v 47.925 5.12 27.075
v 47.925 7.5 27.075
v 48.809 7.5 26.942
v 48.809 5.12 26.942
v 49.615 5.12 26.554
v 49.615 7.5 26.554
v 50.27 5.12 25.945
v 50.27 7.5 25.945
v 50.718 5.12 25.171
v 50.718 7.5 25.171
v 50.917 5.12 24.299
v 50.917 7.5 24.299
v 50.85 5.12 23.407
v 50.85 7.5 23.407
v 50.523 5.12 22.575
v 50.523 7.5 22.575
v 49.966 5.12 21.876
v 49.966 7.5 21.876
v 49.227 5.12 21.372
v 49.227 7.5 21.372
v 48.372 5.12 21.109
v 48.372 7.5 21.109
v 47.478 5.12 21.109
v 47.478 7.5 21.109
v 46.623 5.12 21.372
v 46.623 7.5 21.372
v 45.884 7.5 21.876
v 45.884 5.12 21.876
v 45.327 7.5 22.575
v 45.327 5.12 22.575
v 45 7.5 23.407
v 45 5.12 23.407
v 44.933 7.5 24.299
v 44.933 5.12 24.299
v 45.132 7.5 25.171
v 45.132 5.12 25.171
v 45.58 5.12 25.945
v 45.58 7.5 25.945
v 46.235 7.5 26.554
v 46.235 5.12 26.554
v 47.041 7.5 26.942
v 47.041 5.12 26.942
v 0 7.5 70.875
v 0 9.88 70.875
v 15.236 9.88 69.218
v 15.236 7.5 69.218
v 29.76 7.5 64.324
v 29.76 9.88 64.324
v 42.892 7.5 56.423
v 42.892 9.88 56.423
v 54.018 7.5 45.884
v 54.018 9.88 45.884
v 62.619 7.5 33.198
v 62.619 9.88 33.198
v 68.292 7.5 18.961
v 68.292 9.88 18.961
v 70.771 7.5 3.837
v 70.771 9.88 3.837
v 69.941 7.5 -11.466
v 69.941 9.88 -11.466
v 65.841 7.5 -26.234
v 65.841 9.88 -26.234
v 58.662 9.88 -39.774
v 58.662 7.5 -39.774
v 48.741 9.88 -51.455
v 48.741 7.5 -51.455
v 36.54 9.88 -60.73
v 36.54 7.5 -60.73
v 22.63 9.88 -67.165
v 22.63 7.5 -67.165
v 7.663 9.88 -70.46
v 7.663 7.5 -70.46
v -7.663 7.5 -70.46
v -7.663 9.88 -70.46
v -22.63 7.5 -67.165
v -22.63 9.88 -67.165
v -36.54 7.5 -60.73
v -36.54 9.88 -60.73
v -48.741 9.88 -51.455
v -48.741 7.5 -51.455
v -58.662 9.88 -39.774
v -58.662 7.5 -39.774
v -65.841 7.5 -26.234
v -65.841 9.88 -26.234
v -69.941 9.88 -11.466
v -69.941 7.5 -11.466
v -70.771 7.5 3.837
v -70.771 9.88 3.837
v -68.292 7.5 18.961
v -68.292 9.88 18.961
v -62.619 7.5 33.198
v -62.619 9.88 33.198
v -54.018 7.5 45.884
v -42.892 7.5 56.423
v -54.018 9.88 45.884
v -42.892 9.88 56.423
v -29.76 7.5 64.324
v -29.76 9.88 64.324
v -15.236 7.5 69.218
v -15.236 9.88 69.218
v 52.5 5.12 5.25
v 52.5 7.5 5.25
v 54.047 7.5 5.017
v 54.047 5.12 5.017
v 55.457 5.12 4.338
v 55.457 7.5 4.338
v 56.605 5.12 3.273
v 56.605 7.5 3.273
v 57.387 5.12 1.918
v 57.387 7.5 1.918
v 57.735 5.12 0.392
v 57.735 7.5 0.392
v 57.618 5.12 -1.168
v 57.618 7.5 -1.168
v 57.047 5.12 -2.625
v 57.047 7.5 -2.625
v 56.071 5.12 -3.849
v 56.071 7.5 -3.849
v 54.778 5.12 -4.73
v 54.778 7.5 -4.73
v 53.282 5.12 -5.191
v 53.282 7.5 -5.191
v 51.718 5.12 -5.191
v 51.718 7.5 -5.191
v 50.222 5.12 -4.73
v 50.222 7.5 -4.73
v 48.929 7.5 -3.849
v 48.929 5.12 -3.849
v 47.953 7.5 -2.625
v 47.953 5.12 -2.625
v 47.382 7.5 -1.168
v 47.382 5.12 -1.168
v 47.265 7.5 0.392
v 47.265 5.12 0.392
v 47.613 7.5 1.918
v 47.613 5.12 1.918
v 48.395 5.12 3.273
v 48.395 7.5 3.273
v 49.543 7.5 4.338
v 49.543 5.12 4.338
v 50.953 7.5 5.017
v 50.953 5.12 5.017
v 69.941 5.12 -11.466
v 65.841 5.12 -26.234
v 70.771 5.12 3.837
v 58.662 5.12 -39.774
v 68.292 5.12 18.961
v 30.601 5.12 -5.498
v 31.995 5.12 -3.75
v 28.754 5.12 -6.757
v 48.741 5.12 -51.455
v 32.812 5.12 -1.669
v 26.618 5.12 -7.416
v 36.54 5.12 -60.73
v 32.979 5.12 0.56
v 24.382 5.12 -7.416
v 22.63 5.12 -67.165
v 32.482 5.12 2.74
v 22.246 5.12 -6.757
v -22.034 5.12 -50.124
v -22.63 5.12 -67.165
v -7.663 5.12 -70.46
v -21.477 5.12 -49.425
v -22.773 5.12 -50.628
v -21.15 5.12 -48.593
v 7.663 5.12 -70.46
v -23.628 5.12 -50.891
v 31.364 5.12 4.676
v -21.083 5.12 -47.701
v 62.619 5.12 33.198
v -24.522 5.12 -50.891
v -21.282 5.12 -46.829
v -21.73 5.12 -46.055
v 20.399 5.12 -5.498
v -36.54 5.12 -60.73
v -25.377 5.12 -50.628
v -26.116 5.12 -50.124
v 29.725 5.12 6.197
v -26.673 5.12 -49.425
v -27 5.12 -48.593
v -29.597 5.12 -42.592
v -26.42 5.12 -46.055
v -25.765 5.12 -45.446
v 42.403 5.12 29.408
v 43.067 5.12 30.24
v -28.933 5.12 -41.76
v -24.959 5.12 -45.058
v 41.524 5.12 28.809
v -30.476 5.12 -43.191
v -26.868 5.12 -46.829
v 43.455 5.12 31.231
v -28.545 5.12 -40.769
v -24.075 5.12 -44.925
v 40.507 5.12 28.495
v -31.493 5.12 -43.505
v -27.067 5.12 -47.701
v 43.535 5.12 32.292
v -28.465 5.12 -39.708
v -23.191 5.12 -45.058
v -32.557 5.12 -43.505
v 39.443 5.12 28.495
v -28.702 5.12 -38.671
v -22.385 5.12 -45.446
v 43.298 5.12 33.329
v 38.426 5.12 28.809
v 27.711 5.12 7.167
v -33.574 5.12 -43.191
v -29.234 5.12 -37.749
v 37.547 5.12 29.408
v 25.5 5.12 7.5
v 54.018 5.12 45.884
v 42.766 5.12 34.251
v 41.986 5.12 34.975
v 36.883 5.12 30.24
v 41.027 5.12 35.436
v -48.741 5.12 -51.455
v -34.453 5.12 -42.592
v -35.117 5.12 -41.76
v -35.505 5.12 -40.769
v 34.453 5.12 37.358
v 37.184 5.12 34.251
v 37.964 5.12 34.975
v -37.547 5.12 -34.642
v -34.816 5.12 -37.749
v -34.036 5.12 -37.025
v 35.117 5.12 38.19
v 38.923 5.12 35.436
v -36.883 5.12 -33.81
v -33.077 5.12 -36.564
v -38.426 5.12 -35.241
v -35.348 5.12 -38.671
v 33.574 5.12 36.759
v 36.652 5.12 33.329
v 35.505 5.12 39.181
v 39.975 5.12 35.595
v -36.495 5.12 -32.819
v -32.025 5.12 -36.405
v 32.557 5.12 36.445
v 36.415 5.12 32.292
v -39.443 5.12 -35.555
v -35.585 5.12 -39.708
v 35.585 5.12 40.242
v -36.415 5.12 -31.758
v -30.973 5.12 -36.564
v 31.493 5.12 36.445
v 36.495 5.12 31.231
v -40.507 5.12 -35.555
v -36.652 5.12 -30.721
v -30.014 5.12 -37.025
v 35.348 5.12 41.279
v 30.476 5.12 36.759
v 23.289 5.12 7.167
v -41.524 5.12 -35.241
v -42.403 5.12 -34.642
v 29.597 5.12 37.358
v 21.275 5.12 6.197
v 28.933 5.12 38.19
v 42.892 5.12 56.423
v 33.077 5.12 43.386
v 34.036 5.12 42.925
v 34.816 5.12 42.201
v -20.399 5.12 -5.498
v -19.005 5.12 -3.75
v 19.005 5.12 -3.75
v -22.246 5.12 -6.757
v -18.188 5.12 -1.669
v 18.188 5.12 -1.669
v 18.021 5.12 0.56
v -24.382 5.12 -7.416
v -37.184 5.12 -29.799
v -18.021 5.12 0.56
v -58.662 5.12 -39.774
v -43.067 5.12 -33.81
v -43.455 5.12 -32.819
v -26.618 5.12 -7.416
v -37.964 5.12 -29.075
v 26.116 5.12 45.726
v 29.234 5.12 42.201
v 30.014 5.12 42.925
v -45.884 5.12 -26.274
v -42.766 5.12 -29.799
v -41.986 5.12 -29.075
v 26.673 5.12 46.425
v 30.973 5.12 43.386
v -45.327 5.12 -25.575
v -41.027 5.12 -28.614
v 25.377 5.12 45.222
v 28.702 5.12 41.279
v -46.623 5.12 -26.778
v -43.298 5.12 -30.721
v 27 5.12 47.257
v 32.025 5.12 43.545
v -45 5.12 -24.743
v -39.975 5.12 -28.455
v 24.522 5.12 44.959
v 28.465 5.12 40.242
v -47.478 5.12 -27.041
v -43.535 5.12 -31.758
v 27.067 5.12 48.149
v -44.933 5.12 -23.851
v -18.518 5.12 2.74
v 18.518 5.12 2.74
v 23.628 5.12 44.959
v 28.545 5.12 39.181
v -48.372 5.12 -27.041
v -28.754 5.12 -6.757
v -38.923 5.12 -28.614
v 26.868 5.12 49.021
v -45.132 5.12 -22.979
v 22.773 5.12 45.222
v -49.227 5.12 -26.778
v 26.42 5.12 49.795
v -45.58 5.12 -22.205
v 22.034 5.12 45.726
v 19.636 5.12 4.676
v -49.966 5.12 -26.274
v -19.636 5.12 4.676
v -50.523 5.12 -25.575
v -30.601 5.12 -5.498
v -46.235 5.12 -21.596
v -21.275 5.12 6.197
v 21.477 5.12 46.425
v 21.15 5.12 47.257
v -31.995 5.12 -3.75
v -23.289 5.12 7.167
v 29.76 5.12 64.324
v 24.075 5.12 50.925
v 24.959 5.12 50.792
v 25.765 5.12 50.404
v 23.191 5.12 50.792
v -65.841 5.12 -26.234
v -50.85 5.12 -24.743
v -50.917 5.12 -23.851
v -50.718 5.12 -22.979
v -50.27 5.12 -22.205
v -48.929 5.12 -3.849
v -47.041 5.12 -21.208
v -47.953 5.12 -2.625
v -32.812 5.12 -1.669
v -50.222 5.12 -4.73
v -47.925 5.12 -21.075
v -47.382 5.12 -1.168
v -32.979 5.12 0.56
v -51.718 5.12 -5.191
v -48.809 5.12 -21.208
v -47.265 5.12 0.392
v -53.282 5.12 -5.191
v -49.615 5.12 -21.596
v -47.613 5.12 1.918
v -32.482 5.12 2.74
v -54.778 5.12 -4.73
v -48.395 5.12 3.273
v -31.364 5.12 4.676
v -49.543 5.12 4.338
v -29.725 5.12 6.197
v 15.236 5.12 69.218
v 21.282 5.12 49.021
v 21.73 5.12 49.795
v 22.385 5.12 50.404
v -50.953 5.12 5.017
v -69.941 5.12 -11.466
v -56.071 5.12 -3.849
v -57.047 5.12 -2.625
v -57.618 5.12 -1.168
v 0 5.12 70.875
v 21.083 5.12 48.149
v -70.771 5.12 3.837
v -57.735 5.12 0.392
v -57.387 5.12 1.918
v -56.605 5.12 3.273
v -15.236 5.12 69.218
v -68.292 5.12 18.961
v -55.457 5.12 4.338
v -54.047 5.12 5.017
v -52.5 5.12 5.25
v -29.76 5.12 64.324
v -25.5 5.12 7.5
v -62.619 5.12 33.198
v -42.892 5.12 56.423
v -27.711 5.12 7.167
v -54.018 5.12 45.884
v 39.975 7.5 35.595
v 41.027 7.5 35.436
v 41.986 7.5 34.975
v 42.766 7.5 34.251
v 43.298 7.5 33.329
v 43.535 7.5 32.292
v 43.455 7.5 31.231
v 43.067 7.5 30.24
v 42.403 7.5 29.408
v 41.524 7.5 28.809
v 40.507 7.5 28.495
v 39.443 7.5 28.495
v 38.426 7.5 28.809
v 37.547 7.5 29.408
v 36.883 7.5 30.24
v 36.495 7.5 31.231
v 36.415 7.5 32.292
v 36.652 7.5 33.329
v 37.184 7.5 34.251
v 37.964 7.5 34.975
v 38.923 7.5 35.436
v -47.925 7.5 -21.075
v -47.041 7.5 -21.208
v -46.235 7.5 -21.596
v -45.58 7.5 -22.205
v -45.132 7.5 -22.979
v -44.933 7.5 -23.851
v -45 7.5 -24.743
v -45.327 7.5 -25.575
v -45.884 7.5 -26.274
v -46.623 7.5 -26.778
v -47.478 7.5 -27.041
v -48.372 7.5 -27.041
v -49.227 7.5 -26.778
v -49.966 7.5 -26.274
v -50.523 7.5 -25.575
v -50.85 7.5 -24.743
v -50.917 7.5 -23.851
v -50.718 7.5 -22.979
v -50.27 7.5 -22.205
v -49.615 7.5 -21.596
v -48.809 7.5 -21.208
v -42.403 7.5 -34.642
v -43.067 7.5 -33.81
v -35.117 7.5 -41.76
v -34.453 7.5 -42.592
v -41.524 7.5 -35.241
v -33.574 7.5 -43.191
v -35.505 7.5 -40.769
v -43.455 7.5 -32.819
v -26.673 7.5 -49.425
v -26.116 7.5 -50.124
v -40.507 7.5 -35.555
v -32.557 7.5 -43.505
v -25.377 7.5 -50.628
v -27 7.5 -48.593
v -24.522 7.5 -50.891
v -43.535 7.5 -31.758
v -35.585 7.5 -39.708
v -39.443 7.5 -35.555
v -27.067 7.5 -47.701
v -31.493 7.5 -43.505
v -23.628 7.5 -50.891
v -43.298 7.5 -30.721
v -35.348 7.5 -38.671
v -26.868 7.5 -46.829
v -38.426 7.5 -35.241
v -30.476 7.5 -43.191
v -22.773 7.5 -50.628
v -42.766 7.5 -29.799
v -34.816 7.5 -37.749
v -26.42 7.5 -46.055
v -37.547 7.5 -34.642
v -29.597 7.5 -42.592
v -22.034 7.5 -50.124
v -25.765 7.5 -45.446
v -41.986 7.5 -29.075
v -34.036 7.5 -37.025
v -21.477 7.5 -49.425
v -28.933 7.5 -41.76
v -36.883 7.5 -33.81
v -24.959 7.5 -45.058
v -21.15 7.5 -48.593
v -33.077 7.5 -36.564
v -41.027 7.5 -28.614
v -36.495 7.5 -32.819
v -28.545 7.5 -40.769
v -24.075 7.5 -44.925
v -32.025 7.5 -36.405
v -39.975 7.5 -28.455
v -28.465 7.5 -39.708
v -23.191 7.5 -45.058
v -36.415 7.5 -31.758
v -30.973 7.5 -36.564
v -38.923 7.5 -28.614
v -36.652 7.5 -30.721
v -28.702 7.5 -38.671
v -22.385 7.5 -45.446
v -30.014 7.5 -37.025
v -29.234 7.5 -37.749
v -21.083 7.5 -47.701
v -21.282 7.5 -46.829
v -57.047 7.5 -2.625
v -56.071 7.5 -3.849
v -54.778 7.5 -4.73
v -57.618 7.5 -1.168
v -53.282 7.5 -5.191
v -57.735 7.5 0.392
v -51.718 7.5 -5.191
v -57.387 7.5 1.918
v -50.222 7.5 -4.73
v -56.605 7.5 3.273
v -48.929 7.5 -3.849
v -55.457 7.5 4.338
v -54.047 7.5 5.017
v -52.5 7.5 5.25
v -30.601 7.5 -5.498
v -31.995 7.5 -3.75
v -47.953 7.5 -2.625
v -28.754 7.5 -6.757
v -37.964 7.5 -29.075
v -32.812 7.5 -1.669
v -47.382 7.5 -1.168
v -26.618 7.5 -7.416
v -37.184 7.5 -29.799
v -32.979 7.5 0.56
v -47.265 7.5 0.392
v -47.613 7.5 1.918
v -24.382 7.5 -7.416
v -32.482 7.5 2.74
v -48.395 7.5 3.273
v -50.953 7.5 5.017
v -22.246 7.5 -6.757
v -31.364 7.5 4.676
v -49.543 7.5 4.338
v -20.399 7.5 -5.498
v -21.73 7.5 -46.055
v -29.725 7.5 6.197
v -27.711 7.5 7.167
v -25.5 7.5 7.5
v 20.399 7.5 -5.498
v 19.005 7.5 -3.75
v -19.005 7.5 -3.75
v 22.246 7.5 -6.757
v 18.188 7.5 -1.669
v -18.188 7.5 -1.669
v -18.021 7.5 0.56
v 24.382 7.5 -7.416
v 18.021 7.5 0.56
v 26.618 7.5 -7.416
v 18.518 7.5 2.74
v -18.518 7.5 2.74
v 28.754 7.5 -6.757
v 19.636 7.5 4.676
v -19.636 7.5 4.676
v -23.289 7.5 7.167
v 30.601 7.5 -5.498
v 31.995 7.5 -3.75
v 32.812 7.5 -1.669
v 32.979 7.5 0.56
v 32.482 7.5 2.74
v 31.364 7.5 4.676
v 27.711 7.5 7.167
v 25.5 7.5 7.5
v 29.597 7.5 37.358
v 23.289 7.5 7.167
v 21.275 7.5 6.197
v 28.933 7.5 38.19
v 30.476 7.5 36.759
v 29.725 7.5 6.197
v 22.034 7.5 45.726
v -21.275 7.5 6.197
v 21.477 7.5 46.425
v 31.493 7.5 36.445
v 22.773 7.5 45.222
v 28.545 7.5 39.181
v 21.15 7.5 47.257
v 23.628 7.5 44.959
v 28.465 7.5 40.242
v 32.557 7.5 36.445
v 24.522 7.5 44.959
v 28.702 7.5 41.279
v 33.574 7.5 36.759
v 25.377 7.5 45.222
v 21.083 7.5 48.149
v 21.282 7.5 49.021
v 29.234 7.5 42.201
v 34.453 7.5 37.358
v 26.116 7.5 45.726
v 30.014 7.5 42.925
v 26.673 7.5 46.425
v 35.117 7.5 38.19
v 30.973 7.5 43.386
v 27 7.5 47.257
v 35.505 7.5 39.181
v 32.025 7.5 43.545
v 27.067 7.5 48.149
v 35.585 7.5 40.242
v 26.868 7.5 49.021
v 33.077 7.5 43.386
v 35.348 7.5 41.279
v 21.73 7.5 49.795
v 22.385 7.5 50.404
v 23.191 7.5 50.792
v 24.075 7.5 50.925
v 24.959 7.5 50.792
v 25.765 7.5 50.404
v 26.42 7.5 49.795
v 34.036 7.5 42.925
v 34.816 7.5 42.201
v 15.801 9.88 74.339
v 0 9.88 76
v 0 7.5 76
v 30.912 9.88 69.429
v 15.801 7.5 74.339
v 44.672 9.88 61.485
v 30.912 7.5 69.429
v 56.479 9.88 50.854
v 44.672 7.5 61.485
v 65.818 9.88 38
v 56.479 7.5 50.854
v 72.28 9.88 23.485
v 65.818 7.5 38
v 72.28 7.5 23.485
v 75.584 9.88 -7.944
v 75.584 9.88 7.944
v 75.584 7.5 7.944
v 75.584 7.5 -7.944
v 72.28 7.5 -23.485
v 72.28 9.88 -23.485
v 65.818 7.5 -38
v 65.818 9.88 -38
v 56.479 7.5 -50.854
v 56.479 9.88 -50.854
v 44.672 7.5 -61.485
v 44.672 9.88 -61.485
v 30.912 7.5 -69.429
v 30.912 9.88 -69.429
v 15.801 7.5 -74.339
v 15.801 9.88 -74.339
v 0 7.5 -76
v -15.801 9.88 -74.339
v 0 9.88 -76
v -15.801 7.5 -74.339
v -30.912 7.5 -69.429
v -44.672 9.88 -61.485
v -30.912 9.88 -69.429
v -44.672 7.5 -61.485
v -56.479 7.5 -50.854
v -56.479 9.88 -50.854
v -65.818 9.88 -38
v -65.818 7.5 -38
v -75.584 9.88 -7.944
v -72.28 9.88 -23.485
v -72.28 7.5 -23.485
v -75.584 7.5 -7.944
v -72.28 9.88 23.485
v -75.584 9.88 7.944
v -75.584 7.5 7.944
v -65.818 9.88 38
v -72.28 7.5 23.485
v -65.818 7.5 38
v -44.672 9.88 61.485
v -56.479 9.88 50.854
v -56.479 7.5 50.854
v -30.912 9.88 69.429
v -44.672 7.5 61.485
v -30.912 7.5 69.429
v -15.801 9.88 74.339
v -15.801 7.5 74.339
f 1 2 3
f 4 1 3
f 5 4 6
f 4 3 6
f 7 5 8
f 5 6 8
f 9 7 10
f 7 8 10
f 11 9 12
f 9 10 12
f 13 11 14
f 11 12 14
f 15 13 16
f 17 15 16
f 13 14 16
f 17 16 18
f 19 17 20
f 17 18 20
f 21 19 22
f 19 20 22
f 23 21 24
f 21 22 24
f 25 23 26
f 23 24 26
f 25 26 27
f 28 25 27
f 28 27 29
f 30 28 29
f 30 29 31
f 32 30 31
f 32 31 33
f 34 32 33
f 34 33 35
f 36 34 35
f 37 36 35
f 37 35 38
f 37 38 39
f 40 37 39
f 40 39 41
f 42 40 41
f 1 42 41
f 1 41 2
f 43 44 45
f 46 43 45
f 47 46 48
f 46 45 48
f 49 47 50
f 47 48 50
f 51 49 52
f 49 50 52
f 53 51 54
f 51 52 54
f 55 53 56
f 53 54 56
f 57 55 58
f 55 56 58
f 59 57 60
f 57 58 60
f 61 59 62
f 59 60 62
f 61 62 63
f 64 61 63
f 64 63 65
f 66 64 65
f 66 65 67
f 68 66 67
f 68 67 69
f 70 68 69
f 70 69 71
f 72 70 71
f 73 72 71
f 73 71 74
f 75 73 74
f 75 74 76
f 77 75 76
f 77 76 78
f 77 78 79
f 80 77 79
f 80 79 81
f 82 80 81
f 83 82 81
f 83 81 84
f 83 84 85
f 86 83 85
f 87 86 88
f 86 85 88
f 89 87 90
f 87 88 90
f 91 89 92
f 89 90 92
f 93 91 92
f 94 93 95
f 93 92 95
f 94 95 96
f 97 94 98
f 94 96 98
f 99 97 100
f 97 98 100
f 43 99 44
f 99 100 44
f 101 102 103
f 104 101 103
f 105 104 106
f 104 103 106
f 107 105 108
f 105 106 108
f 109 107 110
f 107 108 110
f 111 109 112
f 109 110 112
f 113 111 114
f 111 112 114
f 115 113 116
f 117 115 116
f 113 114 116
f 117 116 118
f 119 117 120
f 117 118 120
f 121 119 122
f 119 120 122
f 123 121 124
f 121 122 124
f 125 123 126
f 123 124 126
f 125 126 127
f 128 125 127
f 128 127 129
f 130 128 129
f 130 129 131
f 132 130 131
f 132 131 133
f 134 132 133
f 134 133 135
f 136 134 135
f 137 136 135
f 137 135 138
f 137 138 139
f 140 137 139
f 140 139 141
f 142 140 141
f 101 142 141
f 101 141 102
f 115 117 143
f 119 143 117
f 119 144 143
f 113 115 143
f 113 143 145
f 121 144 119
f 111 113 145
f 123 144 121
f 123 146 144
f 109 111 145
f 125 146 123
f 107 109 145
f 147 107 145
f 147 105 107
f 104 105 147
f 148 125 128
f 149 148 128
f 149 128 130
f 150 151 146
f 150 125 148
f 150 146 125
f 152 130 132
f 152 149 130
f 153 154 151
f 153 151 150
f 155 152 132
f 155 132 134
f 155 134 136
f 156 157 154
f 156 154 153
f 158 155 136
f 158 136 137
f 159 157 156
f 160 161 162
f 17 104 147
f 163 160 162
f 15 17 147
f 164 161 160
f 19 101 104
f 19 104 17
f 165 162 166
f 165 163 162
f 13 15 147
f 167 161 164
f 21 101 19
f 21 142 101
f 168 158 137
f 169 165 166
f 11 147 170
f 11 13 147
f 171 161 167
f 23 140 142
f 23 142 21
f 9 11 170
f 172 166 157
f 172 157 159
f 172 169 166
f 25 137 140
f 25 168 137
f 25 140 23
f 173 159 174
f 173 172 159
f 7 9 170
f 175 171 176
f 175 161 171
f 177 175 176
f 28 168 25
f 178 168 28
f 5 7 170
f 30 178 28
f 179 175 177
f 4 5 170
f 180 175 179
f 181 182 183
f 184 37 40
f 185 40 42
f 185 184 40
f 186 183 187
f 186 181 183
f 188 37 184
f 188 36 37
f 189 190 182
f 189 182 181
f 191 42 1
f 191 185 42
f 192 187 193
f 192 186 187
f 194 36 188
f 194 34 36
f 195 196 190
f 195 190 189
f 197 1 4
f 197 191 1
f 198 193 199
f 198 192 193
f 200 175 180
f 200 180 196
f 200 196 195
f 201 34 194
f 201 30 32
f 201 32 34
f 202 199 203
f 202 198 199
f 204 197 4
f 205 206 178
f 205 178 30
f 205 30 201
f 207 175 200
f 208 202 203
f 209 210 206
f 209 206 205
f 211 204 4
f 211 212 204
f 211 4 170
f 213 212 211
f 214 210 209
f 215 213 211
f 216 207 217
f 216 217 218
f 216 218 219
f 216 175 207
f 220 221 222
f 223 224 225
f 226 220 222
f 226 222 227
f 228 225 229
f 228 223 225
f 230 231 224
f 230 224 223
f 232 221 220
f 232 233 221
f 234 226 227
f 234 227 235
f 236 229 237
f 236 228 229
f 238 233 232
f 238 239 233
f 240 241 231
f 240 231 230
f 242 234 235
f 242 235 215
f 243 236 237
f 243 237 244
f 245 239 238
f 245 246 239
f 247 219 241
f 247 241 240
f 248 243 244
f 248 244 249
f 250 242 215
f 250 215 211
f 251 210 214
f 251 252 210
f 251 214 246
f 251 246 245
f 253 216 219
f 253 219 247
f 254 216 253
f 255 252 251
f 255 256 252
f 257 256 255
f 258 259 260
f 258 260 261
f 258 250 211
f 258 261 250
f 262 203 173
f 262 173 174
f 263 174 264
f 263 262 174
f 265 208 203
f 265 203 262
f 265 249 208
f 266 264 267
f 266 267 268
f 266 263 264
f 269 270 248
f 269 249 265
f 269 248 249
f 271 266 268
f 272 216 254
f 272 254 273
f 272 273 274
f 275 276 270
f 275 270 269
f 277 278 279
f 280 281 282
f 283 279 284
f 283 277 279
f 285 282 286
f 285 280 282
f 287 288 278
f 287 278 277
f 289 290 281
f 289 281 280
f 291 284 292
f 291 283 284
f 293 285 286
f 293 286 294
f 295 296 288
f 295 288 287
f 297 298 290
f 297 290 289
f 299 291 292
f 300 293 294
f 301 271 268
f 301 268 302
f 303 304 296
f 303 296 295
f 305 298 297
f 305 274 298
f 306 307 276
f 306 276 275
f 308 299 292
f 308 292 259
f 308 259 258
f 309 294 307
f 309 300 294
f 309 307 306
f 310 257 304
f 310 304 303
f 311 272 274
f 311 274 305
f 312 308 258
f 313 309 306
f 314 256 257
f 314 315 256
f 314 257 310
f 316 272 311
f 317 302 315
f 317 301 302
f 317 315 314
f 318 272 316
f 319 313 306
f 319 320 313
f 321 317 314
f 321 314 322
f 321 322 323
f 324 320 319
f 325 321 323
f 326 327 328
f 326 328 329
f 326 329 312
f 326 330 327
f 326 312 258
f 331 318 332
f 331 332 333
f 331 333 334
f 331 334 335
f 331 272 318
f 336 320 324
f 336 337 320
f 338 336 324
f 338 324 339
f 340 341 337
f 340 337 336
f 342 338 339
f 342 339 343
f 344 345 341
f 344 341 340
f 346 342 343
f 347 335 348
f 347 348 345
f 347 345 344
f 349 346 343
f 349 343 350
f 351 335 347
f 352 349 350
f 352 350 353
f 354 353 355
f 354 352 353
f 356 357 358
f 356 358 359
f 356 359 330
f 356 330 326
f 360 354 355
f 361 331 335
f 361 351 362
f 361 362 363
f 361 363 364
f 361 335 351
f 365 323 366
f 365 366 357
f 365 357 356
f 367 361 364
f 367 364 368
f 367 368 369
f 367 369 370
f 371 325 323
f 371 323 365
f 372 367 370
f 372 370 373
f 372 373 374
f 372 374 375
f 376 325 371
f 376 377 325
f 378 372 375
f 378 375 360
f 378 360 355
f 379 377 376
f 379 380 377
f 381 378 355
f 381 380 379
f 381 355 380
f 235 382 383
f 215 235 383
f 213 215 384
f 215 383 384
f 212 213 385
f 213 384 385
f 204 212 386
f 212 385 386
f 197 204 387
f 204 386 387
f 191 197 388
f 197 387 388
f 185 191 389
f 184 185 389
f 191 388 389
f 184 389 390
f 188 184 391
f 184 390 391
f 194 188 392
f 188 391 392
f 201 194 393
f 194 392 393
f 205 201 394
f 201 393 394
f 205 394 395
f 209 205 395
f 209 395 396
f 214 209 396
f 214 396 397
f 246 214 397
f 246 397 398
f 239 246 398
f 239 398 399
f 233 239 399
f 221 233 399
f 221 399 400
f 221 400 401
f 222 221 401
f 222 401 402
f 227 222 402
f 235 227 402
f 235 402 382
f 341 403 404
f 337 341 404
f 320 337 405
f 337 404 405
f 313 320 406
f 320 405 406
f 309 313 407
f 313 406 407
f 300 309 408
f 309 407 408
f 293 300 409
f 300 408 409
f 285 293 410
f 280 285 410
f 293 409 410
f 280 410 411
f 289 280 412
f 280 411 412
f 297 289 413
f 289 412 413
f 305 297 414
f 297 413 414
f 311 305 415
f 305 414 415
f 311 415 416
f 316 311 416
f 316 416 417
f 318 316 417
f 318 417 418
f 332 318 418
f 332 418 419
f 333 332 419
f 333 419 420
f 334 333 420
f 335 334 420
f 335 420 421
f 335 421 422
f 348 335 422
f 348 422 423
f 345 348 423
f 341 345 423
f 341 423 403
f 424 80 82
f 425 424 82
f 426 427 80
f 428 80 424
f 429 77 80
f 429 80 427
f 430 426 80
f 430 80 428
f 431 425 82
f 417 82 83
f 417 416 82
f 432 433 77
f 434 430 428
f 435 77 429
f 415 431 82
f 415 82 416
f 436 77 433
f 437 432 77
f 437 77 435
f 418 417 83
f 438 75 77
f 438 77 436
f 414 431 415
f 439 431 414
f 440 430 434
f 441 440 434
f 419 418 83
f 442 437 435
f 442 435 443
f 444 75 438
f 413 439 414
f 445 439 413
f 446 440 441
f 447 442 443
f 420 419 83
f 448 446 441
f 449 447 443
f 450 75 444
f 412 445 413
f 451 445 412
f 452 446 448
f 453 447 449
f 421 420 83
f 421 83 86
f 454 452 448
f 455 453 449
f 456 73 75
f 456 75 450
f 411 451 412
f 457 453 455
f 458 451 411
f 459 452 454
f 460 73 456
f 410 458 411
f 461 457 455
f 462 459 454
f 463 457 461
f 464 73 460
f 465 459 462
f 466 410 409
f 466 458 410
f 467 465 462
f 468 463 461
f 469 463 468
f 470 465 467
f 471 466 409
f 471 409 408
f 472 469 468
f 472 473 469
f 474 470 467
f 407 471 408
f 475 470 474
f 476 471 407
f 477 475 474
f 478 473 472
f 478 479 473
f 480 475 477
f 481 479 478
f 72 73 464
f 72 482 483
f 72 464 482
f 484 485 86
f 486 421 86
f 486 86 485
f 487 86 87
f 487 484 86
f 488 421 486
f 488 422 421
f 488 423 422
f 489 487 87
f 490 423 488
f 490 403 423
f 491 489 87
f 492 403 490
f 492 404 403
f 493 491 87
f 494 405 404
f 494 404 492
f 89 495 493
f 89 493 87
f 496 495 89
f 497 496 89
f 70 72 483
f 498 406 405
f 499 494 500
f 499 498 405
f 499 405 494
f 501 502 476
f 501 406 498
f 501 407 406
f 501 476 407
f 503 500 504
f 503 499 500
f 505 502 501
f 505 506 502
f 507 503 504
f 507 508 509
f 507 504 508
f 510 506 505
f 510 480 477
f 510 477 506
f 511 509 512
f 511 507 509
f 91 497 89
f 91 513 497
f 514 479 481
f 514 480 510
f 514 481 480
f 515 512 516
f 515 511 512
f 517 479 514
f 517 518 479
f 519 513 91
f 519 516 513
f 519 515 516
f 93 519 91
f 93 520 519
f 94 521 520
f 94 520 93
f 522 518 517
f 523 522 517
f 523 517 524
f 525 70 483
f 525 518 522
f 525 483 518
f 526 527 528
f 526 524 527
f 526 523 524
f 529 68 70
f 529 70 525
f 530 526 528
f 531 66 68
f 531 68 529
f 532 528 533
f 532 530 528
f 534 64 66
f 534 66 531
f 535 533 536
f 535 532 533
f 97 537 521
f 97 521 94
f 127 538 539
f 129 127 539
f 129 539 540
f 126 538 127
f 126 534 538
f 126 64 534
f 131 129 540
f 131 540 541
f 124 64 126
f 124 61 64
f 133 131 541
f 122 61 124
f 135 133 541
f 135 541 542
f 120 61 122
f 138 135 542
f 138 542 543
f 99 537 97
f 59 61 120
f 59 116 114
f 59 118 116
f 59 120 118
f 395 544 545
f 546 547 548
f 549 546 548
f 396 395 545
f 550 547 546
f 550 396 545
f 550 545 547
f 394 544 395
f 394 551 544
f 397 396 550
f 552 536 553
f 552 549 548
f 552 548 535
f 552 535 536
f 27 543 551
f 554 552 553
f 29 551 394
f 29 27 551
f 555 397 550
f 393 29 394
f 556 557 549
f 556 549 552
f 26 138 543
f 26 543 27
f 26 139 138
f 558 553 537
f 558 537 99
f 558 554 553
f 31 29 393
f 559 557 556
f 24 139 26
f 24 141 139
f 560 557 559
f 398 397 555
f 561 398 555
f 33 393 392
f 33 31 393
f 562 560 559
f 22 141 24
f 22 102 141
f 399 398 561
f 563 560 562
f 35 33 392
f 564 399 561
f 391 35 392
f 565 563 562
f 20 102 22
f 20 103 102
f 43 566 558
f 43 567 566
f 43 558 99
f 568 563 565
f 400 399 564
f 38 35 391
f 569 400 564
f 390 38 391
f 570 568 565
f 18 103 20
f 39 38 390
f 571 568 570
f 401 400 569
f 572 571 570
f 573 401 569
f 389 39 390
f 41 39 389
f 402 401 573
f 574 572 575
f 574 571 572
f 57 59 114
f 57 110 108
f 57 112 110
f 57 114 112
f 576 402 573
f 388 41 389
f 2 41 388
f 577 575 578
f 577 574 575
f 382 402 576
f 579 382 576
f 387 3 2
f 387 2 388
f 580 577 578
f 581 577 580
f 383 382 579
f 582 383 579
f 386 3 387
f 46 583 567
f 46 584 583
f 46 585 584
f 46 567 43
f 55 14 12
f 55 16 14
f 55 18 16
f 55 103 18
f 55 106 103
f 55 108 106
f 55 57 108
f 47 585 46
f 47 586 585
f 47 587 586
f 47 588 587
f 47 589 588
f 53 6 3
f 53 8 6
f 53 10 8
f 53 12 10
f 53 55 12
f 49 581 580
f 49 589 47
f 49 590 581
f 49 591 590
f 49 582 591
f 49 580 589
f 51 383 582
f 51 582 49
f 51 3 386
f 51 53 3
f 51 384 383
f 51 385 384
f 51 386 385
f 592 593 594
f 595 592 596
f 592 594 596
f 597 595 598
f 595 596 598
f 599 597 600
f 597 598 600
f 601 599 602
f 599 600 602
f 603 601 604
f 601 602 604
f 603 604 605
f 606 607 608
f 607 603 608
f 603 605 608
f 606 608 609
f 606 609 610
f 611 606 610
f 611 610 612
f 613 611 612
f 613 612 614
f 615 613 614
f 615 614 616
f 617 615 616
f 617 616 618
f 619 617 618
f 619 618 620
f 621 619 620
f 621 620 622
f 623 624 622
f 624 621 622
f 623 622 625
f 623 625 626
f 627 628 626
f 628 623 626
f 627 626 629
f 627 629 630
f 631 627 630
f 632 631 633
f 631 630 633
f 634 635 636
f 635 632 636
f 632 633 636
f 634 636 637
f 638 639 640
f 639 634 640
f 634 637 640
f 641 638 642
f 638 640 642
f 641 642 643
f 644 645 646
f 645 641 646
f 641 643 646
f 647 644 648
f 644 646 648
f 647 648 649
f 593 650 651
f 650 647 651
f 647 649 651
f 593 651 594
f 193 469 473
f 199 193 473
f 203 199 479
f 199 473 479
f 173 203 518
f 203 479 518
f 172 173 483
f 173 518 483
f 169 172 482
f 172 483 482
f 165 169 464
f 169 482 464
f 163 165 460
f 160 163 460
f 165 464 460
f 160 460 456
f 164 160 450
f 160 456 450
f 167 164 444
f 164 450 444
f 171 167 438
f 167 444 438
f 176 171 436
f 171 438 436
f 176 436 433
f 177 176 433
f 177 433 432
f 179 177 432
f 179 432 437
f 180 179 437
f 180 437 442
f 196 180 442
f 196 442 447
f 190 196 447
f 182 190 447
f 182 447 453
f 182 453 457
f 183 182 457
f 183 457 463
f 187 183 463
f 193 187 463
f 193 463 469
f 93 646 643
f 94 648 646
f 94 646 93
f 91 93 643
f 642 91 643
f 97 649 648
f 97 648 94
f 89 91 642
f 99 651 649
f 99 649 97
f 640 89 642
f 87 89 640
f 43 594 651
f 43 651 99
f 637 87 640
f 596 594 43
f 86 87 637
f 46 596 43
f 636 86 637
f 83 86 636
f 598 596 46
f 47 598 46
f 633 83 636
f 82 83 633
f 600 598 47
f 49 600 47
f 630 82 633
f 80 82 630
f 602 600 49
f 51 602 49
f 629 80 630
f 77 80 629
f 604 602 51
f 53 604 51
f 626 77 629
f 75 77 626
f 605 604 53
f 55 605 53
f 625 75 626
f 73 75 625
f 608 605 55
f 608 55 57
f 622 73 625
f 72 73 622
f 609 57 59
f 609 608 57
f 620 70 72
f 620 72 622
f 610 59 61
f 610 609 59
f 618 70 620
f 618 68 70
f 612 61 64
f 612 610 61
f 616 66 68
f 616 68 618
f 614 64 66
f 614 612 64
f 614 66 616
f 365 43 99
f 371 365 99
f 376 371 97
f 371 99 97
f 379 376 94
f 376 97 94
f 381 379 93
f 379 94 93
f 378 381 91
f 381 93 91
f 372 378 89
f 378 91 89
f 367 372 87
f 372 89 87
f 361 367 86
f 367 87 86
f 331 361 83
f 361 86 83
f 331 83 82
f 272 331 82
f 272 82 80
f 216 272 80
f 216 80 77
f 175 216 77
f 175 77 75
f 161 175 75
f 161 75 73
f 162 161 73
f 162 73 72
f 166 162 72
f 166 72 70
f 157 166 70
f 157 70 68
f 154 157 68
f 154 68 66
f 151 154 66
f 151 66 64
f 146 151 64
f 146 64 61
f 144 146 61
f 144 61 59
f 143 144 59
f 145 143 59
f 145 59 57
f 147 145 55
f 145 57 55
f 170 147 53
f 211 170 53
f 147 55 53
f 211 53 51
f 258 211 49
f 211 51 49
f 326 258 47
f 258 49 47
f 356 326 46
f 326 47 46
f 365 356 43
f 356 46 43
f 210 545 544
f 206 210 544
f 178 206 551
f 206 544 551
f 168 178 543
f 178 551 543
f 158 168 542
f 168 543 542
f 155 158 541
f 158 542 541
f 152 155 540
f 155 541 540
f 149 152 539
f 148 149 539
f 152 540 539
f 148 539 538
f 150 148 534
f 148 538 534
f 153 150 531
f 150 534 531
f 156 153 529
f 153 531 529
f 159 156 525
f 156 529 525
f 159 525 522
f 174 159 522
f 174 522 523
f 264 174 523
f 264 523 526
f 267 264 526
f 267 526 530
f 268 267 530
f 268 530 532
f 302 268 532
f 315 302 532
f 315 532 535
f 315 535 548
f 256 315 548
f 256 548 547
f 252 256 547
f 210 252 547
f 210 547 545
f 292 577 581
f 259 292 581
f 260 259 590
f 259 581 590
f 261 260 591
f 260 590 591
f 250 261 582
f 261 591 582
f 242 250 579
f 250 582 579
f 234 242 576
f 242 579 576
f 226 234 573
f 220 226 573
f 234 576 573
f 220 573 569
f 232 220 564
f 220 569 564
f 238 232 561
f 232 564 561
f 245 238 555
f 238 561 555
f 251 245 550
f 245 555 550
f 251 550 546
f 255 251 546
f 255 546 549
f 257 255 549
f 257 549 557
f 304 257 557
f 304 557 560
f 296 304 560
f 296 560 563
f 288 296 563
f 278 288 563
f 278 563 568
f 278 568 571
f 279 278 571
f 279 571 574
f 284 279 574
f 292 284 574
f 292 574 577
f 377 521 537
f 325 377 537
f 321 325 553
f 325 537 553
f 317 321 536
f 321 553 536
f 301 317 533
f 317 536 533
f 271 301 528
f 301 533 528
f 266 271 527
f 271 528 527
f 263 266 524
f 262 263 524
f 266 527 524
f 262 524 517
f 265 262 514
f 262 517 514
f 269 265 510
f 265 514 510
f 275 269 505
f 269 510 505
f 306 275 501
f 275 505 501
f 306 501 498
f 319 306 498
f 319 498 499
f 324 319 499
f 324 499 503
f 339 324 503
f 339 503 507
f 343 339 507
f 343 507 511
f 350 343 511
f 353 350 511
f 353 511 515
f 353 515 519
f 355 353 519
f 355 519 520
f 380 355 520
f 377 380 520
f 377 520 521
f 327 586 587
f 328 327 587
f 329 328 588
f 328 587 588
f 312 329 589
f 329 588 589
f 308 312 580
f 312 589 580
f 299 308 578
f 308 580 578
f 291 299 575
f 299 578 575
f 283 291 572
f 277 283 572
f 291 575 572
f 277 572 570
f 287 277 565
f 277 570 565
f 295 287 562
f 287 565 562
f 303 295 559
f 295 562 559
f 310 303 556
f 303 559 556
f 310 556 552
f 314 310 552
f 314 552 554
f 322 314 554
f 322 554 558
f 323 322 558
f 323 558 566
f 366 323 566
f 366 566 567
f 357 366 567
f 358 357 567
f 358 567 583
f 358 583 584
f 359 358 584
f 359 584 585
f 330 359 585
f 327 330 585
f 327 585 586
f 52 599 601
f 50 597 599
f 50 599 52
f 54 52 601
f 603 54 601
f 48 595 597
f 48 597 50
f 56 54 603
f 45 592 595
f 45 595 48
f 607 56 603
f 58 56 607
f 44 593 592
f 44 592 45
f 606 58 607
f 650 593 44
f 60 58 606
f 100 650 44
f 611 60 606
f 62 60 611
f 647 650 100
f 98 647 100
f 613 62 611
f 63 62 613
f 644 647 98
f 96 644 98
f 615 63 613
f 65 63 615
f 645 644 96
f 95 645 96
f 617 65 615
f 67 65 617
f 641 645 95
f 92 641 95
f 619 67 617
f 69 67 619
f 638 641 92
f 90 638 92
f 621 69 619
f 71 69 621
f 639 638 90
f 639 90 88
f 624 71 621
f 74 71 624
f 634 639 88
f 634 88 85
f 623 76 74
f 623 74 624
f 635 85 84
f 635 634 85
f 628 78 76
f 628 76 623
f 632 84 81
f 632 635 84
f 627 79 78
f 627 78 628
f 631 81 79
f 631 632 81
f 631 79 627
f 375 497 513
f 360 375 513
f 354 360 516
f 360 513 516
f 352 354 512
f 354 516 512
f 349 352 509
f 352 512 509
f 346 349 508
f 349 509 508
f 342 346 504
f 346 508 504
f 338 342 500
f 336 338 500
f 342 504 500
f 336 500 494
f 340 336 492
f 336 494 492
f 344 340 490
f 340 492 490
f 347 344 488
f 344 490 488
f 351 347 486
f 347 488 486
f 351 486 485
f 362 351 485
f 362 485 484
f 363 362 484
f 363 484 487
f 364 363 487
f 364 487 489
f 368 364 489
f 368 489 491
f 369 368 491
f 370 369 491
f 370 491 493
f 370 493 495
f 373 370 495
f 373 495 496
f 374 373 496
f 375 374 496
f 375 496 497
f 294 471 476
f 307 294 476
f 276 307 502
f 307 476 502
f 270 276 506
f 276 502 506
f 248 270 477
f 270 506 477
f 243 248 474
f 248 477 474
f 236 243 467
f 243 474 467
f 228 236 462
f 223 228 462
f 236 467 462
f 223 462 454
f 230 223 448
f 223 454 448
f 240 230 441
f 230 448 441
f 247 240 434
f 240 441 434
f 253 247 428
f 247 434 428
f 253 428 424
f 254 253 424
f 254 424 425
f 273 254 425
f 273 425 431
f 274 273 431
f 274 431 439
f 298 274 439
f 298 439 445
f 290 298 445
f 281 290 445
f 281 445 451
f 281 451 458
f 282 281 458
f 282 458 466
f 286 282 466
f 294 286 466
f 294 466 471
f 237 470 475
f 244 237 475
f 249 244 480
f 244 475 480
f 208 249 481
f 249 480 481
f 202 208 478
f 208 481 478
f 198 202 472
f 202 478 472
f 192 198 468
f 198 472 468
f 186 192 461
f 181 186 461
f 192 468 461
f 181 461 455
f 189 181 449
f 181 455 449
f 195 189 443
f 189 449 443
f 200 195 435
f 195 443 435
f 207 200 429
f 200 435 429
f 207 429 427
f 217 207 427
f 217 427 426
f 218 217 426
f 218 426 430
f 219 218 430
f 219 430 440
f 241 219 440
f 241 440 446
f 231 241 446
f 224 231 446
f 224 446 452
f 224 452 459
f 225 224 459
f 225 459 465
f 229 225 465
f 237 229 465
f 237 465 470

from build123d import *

# Parameters (mm, degrees)
SKETCH1_R           = 76
BOSS_EXTRUDE1_DEPTH = 15
SKETCH2_R           = 70.875
CUT_EXTRUDE1_DEPTH  = 7.5
CUT_EXTRUDE2_START  = -7.5
SKETCH3_R           = 74.25
SKETCH3_R_2         = 70.875
CUT_EXTRUDE2_DEPTH  = 7.5
SKETCH4_R           = 7.5
SKETCH4_R_2         = 5.25
SKETCH4_R_3         = 3.57
SKETCH4_R_4         = 3
CUT_EXTRUDE3_DEPTH  = 7.5
SKETCH10_R          = 76
SKETCH10_R_2        = 74.035858408
CUT_EXTRUDE6_DEPTH  = 7.5
SKETCH12_R          = 76
CUT_EXTRUDE8_DEPTH  = 5.12
SKETCH13_R          = 70.875
CUT_EXTRUDE9_DEPTH  = 5.12


with BuildPart() as part:
    # Sketch1 → Boss-Extrude1 (new body)
    with BuildSketch(Plane(origin=(0, 0, 0), x_dir=(1, 0, 0), z_dir=(0, 1, 0))):
        with Locations(Location((0, 0, 0), (0, 0, 270))):
            Circle(SKETCH1_R)
    extrude(amount=BOSS_EXTRUDE1_DEPTH)

    # Sketch2 → Cut-Extrude1 (cut)
    with BuildSketch(Plane(origin=(0, 15, 0), x_dir=(1, 0, 0), z_dir=(0, 1, 0))):
        with Locations(Location((0, 0, 0), (0, 0, 270))):
            Circle(SKETCH2_R)
    extrude(amount=-CUT_EXTRUDE1_DEPTH, mode=Mode.SUBTRACT)

    # Sketch3 → Cut-Extrude2 (cut)
    with BuildSketch(Plane(origin=(0, 0, 0), x_dir=(-1, 0, 0), z_dir=(0, -1, 0)).offset(CUT_EXTRUDE2_START)):
        with Locations(Location((0, 0, 0), (0, 0, 90))):
            Circle(SKETCH3_R)
        with Locations(Location((0, 0, 0), (0, 0, 270))):
            Circle(SKETCH3_R_2, mode=Mode.SUBTRACT)
    extrude(amount=CUT_EXTRUDE2_DEPTH, mode=Mode.SUBTRACT)


with BuildPart() as cut_extrude2_piece_1:
    # of the separate pieces the step leaves, piece 1, a body of its own (cut_extrude2_pieces)
    add(part.part.solids().sort_by_distance((0, 0, 70.875))[0])

    # Sketch4 → Cut-Extrude3 (cut)
    with BuildSketch(Plane(origin=(0, 7.5, 0), x_dir=(1, 0, 0), z_dir=(0, 1, 0))):
        with Locations(Location((-25.5, 0, 0), (0, 0, 270))):
            Circle(SKETCH4_R)
        with Locations(Location((-52.5, 0, 0), (0, 0, 270))):
            Circle(SKETCH4_R_2)
        with Locations(Location((25.5, 0, 0), (0, 0, 270))):
            Circle(SKETCH4_R)
        with Locations(Location((52.5, 0, 0), (0, 0, 270))):
            Circle(SKETCH4_R_2)
        with Locations(Location((-32.025, 39.975, 0), (0, 0, 270))):
            Circle(SKETCH4_R_3)
        with Locations(Location((-39.975, 32.025, 0), (0, 0, 270))):
            Circle(SKETCH4_R_3)
        with Locations(Location((-47.925, 24.075, 0), (0, 0, 270))):
            Circle(SKETCH4_R_4)
        with Locations(Location((-24.075, 47.925, 0), (0, 0, 270))):
            Circle(SKETCH4_R_4)
        with Locations(Location((32.025, -39.975, 0), (0, 0, 270))):
            Circle(SKETCH4_R_3)
        with Locations(Location((39.975, -32.025, 0), (0, 0, 270))):
            Circle(SKETCH4_R_3)
        with Locations(Location((47.925, -24.075, 0), (0, 0, 270))):
            Circle(SKETCH4_R_4)
        with Locations(Location((24.075, -47.925, 0), (0, 0, 270))):
            Circle(SKETCH4_R_4)
    extrude(amount=-CUT_EXTRUDE3_DEPTH, mode=Mode.SUBTRACT)

    # Sketch13 → Cut-Extrude9 (cut)
    with BuildSketch(Plane.XZ):
        with Locations(Location((0, 0, 0), (0, 0, 90))):
            Circle(SKETCH13_R)
    extrude(amount=-CUT_EXTRUDE9_DEPTH, mode=Mode.SUBTRACT)


with BuildPart() as cut_extrude2_piece_2:
    # of the separate pieces the step leaves, piece 2, a body of its own (cut_extrude2_pieces)
    add(part.part.solids().sort_by_distance((0, 0, 76))[0])

    # Sketch10 → Cut-Extrude6 (cut)
    with BuildSketch(Plane.XZ):
        with Locations(Location((0, 0, 0), (0, 0, 270))):
            Circle(SKETCH10_R)
        Circle(SKETCH10_R_2, mode=Mode.SUBTRACT)
    extrude(amount=-CUT_EXTRUDE6_DEPTH, mode=Mode.SUBTRACT)

    # Sketch12 → Cut-Extrude8 (cut)
    with BuildSketch(Plane(origin=(0, 15, 0), x_dir=(1, 0, 0), z_dir=(0, 1, 0))):
        with Locations(Location((0, 0, 0), (0, 0, 90))):
            Circle(SKETCH12_R)
    extrude(amount=-CUT_EXTRUDE8_DEPTH, mode=Mode.SUBTRACT)


solid = Compound([cut_extrude2_piece_1.part, cut_extrude2_piece_2.part])
